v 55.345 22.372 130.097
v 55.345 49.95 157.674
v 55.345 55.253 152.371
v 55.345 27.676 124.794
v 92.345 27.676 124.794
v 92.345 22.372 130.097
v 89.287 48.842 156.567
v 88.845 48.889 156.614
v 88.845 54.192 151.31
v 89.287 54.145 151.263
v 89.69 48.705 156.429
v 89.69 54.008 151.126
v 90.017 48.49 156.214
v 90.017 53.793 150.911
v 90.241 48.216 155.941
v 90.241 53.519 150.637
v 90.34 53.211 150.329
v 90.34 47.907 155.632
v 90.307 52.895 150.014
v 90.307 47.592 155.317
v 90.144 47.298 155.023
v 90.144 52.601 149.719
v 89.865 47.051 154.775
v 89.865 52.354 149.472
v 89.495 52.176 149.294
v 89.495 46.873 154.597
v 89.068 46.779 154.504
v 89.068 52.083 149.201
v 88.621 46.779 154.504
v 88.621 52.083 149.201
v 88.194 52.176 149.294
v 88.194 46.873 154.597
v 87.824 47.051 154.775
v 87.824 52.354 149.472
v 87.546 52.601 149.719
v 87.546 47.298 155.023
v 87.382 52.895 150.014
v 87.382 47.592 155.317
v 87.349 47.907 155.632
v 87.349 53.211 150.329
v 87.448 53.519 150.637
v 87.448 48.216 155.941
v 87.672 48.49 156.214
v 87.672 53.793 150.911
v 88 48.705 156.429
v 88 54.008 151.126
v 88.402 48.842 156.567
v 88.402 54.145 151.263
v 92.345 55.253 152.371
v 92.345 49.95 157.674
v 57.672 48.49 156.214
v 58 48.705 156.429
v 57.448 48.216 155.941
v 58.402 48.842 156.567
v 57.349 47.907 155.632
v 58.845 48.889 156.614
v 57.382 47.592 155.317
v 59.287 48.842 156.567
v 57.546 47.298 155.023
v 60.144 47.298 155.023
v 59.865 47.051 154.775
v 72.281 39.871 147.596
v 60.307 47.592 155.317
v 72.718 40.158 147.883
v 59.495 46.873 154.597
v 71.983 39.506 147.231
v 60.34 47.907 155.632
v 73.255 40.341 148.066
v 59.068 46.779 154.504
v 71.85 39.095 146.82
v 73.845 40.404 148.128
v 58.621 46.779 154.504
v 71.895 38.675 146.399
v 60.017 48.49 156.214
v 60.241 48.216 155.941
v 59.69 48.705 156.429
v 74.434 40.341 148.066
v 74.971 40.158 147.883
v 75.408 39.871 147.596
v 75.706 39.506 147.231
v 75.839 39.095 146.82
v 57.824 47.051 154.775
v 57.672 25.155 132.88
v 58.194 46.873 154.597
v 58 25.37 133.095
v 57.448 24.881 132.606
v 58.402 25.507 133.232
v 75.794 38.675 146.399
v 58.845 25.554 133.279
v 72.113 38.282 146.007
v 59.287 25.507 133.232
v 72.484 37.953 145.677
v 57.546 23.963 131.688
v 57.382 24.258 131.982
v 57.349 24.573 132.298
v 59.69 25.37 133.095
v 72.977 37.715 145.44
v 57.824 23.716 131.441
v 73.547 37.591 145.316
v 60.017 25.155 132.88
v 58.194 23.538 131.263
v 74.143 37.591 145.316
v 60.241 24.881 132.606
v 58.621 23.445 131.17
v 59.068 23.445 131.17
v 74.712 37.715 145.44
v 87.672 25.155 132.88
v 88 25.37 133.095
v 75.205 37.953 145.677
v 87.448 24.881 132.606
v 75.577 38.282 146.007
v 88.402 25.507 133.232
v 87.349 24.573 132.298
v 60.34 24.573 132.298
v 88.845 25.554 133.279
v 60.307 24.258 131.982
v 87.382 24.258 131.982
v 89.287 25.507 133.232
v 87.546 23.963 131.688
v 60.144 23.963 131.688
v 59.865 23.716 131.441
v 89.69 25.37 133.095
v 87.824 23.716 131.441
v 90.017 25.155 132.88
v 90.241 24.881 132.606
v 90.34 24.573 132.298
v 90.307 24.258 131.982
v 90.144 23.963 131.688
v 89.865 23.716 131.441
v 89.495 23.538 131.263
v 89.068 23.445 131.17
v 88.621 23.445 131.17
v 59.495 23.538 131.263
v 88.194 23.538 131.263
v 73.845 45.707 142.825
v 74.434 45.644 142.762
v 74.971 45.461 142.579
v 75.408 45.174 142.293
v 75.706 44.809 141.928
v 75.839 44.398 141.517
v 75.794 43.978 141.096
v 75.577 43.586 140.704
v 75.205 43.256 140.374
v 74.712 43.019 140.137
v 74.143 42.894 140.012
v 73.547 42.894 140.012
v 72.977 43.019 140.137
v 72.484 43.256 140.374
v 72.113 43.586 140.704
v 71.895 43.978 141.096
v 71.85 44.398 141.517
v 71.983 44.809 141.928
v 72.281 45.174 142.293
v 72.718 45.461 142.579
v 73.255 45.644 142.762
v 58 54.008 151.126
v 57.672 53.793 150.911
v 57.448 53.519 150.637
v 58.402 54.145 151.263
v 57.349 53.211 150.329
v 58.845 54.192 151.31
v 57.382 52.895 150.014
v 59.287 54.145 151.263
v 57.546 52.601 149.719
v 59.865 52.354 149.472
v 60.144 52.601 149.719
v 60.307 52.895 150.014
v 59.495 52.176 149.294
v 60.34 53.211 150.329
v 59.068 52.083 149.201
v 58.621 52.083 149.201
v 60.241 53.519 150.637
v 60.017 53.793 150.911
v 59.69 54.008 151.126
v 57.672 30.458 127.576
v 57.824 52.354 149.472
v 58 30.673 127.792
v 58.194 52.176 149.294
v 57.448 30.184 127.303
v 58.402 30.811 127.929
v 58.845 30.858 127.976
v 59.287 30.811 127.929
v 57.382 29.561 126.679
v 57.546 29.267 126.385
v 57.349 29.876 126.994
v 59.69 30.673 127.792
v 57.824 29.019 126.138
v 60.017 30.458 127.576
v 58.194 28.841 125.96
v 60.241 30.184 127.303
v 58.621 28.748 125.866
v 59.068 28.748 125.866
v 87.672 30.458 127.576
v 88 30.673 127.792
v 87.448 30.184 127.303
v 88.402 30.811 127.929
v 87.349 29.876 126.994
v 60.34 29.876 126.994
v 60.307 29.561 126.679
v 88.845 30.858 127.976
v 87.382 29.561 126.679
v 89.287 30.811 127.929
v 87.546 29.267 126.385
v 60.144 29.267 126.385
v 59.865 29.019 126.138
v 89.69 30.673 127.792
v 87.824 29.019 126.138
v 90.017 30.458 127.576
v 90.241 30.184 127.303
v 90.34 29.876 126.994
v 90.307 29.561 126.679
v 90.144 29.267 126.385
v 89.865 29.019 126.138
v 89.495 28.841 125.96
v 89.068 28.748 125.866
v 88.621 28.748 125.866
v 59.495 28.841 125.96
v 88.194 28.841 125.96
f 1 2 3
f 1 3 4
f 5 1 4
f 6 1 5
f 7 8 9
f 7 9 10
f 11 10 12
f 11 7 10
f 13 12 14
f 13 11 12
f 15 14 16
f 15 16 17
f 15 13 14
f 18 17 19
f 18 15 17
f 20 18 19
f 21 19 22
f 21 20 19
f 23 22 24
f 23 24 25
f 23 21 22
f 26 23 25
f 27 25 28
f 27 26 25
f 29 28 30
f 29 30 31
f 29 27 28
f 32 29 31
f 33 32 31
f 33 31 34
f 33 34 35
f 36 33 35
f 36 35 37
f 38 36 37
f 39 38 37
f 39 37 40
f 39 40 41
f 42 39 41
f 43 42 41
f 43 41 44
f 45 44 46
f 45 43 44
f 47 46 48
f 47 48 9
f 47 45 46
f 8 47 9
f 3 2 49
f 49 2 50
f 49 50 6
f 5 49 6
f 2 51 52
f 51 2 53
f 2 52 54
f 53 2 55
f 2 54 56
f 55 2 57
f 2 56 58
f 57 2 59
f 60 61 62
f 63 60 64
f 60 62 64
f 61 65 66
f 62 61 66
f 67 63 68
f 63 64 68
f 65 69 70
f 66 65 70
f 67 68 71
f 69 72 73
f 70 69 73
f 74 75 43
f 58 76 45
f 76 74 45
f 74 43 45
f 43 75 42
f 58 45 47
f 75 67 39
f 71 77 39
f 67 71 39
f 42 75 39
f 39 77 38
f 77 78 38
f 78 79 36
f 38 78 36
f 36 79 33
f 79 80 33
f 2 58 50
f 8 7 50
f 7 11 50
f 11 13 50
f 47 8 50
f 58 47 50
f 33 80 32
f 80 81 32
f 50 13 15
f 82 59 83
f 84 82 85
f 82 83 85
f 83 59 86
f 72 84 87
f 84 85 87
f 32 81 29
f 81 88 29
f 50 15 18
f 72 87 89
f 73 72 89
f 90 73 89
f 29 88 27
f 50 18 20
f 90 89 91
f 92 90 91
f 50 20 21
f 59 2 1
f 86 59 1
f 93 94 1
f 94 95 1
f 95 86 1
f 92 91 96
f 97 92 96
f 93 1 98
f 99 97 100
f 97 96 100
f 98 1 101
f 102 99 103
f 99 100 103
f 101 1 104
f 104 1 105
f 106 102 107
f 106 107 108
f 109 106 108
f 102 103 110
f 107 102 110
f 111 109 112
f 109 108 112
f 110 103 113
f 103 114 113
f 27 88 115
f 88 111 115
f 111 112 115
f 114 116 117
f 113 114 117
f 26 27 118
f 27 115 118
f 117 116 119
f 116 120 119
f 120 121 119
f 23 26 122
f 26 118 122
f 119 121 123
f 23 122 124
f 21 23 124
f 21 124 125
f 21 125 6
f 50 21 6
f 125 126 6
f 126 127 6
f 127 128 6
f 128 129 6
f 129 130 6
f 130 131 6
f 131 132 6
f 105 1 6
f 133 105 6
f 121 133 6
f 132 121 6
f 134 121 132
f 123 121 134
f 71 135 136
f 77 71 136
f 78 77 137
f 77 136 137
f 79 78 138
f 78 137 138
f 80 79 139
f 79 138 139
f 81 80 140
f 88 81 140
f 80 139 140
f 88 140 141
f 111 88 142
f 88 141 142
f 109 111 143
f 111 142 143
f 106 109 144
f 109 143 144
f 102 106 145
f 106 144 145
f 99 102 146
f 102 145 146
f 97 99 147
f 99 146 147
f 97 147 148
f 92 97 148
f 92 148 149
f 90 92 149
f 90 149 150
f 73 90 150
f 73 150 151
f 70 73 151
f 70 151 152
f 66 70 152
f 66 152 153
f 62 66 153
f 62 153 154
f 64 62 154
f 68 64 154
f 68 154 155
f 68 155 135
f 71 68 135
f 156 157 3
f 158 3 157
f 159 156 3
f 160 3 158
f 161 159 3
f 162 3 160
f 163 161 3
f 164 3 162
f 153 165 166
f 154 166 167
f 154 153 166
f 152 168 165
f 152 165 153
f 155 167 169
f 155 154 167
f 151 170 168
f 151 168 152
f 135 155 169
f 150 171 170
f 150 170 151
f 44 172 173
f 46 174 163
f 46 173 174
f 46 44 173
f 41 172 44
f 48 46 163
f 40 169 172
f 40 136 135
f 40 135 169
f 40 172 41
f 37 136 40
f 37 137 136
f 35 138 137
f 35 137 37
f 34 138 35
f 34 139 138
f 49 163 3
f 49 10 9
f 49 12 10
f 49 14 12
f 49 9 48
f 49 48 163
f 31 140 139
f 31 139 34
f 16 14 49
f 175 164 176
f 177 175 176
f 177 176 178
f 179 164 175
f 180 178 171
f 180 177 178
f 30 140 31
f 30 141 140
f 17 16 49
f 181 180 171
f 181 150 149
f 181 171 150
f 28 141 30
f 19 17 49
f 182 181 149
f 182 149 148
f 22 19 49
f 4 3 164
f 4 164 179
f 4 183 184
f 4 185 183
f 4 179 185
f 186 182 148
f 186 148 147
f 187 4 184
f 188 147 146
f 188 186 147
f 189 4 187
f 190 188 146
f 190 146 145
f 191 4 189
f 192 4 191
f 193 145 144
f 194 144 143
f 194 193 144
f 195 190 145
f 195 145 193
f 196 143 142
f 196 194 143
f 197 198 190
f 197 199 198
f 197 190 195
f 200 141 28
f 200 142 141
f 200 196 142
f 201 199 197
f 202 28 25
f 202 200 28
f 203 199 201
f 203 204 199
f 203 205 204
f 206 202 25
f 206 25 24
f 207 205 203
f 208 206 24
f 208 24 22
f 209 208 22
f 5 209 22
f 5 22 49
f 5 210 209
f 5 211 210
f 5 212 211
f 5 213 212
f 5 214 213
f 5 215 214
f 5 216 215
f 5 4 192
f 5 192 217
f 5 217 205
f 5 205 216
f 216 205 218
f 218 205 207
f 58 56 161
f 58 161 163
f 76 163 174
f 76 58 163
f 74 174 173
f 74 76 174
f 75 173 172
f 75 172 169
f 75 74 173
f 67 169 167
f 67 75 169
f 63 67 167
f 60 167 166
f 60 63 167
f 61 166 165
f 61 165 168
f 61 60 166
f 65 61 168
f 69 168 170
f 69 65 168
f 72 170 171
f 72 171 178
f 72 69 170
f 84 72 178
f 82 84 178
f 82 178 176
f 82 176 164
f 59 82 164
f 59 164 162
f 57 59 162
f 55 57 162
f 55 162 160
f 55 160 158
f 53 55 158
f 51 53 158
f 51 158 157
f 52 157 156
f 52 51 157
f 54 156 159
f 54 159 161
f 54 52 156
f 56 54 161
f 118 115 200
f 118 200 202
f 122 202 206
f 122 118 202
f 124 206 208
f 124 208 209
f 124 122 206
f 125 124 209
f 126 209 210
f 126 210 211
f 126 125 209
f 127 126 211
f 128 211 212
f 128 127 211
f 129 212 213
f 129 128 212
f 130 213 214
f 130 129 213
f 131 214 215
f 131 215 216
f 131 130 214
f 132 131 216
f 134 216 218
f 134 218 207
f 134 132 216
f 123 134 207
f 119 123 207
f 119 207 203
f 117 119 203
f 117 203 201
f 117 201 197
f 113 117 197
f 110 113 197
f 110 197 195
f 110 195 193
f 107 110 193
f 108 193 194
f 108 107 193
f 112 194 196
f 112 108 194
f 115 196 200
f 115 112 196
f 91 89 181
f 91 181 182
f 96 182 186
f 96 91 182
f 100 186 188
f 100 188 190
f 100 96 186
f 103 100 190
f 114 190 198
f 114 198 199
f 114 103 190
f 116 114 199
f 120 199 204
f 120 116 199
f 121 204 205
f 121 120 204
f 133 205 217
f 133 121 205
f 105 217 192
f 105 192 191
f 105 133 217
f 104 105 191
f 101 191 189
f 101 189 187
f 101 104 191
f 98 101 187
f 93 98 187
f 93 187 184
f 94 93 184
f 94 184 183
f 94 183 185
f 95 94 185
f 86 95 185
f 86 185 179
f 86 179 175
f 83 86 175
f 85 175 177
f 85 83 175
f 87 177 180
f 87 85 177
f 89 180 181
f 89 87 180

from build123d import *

# Parameters (mm, degrees)
SKETCH1_W           = 37
SKETCH1_H           = 39
SKETCH1_R           = 1.5
BOSS_EXTRUDE1_DEPTH = 7.5
SKETCH2_R           = 2
CUT_EXTRUDE1_DEPTH  = 177.665153947


with BuildPart() as part:
    # Sketch1 → Boss-Extrude1 (new body)
    with BuildSketch(Plane(origin=(0, -53.862394692, 53.862394692), x_dir=(1, 0, 0), z_dir=(0, 0.7071067811865502, -0.7071067811865449))):
        with Locations((73.844609768, -127.312236852)):
            Rectangle(SKETCH1_W, SKETCH1_H)
        with Locations(Location((88.844609768, -143.812236852, 0), (0, 0, 270))):
            Circle(SKETCH1_R, mode=Mode.SUBTRACT)
        with Locations(Location((58.844609768, -143.812236852, 0), (0, 0, 270))):
            Circle(SKETCH1_R, mode=Mode.SUBTRACT)
        with Locations(Location((58.844609768, -110.812236852, 0), (0, 0, 270))):
            Circle(SKETCH1_R, mode=Mode.SUBTRACT)
        with Locations(Location((88.844609768, -110.812236852, 0), (0, 0, 270))):
            Circle(SKETCH1_R, mode=Mode.SUBTRACT)
    extrude(amount=BOSS_EXTRUDE1_DEPTH)

    # Sketch2 → Cut-Extrude1 (cut, through all)
    with BuildSketch(Plane(origin=(0, -48.559093833, 48.559093833), x_dir=(1, 0, 0), z_dir=(0, 0.7071067811865502, -0.7071067811865449))):
        with Locations(Location((73.844609768, -131.312236852, 0), (0, 0, 270))):
            Circle(SKETCH2_R)
    extrude(amount=-CUT_EXTRUDE1_DEPTH, mode=Mode.SUBTRACT)


solid = part.part
